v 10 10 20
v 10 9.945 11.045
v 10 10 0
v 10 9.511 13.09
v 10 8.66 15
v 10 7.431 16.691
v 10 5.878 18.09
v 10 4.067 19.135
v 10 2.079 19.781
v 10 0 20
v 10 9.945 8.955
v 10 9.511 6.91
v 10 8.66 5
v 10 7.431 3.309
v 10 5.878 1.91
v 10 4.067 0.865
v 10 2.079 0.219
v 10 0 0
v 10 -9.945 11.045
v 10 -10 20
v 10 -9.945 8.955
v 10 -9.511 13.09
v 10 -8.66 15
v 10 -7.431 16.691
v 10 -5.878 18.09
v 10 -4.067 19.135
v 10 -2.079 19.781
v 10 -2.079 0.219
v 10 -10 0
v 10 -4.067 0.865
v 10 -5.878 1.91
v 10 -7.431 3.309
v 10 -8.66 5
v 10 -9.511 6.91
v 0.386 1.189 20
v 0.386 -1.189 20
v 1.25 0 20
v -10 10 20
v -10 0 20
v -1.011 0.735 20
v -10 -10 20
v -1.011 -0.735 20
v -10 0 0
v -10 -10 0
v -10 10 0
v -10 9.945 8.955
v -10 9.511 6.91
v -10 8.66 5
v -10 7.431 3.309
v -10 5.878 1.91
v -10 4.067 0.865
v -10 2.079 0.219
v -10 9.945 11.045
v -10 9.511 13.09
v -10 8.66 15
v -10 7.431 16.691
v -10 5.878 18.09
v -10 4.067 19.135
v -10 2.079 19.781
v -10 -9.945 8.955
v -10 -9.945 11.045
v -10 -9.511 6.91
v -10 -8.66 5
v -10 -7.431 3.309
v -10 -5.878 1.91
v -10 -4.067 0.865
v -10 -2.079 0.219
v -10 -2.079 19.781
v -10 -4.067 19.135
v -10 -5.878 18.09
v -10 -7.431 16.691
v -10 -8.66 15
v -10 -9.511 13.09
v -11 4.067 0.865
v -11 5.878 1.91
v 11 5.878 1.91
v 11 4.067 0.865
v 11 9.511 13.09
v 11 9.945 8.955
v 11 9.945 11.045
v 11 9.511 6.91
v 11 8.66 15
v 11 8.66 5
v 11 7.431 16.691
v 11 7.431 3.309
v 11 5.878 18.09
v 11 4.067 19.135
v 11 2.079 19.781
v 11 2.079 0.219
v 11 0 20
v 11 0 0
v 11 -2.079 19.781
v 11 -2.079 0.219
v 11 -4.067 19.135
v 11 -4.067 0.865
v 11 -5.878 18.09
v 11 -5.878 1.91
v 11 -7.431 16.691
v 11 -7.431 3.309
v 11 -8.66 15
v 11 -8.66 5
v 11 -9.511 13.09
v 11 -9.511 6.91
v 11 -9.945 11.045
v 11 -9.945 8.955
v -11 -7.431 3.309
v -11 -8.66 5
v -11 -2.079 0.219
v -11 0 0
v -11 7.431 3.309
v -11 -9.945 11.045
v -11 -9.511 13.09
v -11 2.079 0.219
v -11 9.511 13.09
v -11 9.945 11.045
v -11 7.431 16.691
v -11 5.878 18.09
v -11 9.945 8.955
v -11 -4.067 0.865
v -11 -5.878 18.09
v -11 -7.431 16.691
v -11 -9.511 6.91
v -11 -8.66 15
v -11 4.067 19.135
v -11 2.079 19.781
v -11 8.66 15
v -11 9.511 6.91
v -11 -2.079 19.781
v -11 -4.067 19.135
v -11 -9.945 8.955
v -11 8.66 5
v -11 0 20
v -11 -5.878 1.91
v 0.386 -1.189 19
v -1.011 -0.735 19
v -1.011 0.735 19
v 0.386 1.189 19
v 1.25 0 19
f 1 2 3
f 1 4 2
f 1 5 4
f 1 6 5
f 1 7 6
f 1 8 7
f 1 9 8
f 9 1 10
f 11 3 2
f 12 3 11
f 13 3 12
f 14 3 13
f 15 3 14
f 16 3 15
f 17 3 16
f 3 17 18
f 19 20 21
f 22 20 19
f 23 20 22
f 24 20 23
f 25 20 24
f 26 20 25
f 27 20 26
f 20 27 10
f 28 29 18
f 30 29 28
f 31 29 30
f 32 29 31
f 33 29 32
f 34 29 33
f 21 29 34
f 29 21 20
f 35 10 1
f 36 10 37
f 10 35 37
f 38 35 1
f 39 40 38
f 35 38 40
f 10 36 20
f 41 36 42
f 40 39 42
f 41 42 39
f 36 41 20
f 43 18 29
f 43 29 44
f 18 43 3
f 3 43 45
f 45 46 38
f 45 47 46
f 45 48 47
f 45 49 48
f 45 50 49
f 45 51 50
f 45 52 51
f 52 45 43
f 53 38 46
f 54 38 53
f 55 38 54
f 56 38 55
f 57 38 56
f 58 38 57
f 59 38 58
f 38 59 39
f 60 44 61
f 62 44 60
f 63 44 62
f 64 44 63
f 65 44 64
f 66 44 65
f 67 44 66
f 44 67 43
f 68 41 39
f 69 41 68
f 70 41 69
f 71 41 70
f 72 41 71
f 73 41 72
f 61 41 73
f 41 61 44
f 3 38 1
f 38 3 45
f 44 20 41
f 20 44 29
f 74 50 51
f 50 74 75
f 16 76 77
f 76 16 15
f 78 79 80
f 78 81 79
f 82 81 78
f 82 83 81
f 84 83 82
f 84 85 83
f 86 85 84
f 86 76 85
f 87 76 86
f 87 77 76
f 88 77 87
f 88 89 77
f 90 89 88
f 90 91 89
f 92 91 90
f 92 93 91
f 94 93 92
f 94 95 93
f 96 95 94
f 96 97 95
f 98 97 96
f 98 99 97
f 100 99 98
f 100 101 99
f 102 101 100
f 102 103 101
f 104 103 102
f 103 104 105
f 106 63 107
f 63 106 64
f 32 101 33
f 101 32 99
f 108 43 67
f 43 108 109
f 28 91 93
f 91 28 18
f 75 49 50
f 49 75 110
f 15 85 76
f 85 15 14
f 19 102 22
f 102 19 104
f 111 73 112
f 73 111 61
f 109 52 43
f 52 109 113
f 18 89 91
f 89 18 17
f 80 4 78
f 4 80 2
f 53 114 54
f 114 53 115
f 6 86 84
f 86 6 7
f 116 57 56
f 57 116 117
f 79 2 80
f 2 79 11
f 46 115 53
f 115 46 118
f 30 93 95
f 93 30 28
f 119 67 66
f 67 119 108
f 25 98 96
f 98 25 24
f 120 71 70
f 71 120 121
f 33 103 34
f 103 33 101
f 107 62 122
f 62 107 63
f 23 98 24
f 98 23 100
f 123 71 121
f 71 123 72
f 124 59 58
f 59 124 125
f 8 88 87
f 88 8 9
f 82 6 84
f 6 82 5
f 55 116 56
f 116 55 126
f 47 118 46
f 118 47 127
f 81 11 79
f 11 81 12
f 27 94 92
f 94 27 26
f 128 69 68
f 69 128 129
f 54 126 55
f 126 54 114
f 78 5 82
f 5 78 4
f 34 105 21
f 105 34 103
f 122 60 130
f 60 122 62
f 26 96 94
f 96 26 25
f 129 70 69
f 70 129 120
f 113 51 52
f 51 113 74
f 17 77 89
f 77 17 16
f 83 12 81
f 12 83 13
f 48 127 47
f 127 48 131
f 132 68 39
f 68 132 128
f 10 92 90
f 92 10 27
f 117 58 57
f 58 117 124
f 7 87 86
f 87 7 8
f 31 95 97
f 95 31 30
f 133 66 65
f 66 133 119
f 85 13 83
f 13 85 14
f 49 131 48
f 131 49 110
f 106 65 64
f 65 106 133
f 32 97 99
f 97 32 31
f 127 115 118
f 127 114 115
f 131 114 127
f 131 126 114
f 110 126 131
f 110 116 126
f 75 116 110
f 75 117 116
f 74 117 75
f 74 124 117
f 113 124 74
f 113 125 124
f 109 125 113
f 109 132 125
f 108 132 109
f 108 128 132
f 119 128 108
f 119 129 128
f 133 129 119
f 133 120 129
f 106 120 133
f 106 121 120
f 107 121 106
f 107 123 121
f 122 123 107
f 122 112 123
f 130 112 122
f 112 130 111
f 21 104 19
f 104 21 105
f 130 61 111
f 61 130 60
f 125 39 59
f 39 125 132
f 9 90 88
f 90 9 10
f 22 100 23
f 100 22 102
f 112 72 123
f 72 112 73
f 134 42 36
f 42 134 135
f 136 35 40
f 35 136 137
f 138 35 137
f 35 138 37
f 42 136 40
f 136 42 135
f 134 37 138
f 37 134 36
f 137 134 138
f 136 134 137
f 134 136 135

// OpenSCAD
cube_size = 20; // [10:Small,20:Medium,30:Large]

hole_diameter = 2.5;
hole_radius = hole_diameter/2;

// How deep should the center hole be?
hole_depth = 1; // [0,1,5,50]

show_wheels = "yes"; // [yes,no]

// How thick should the side wheels be?
wheel_thickness = 1; // [1:40]

// ignore this variable!
// foo=1;

// don't turn functions into params!
function BEZ03(u) = pow((1-u), 3);

// ignore variable values
bing = 3+4;
baz = 3 / hole_depth;

difference() {
  union() {
    translate([0, 0, cube_size/2]) cube([cube_size,cube_size,cube_size], center=true);
    if (show_wheels == "yes") {
      translate([0, 0, cube_size/2]) rotate([0, 90, 0]) {
        cylinder(r=cube_size/2, h=cube_size+(wheel_thickness*2), center=true);
      }
    }
  }
  translate([0, 0, cube_size-hole_depth]) cylinder(r=hole_radius, h=hole_depth);
}          
        
